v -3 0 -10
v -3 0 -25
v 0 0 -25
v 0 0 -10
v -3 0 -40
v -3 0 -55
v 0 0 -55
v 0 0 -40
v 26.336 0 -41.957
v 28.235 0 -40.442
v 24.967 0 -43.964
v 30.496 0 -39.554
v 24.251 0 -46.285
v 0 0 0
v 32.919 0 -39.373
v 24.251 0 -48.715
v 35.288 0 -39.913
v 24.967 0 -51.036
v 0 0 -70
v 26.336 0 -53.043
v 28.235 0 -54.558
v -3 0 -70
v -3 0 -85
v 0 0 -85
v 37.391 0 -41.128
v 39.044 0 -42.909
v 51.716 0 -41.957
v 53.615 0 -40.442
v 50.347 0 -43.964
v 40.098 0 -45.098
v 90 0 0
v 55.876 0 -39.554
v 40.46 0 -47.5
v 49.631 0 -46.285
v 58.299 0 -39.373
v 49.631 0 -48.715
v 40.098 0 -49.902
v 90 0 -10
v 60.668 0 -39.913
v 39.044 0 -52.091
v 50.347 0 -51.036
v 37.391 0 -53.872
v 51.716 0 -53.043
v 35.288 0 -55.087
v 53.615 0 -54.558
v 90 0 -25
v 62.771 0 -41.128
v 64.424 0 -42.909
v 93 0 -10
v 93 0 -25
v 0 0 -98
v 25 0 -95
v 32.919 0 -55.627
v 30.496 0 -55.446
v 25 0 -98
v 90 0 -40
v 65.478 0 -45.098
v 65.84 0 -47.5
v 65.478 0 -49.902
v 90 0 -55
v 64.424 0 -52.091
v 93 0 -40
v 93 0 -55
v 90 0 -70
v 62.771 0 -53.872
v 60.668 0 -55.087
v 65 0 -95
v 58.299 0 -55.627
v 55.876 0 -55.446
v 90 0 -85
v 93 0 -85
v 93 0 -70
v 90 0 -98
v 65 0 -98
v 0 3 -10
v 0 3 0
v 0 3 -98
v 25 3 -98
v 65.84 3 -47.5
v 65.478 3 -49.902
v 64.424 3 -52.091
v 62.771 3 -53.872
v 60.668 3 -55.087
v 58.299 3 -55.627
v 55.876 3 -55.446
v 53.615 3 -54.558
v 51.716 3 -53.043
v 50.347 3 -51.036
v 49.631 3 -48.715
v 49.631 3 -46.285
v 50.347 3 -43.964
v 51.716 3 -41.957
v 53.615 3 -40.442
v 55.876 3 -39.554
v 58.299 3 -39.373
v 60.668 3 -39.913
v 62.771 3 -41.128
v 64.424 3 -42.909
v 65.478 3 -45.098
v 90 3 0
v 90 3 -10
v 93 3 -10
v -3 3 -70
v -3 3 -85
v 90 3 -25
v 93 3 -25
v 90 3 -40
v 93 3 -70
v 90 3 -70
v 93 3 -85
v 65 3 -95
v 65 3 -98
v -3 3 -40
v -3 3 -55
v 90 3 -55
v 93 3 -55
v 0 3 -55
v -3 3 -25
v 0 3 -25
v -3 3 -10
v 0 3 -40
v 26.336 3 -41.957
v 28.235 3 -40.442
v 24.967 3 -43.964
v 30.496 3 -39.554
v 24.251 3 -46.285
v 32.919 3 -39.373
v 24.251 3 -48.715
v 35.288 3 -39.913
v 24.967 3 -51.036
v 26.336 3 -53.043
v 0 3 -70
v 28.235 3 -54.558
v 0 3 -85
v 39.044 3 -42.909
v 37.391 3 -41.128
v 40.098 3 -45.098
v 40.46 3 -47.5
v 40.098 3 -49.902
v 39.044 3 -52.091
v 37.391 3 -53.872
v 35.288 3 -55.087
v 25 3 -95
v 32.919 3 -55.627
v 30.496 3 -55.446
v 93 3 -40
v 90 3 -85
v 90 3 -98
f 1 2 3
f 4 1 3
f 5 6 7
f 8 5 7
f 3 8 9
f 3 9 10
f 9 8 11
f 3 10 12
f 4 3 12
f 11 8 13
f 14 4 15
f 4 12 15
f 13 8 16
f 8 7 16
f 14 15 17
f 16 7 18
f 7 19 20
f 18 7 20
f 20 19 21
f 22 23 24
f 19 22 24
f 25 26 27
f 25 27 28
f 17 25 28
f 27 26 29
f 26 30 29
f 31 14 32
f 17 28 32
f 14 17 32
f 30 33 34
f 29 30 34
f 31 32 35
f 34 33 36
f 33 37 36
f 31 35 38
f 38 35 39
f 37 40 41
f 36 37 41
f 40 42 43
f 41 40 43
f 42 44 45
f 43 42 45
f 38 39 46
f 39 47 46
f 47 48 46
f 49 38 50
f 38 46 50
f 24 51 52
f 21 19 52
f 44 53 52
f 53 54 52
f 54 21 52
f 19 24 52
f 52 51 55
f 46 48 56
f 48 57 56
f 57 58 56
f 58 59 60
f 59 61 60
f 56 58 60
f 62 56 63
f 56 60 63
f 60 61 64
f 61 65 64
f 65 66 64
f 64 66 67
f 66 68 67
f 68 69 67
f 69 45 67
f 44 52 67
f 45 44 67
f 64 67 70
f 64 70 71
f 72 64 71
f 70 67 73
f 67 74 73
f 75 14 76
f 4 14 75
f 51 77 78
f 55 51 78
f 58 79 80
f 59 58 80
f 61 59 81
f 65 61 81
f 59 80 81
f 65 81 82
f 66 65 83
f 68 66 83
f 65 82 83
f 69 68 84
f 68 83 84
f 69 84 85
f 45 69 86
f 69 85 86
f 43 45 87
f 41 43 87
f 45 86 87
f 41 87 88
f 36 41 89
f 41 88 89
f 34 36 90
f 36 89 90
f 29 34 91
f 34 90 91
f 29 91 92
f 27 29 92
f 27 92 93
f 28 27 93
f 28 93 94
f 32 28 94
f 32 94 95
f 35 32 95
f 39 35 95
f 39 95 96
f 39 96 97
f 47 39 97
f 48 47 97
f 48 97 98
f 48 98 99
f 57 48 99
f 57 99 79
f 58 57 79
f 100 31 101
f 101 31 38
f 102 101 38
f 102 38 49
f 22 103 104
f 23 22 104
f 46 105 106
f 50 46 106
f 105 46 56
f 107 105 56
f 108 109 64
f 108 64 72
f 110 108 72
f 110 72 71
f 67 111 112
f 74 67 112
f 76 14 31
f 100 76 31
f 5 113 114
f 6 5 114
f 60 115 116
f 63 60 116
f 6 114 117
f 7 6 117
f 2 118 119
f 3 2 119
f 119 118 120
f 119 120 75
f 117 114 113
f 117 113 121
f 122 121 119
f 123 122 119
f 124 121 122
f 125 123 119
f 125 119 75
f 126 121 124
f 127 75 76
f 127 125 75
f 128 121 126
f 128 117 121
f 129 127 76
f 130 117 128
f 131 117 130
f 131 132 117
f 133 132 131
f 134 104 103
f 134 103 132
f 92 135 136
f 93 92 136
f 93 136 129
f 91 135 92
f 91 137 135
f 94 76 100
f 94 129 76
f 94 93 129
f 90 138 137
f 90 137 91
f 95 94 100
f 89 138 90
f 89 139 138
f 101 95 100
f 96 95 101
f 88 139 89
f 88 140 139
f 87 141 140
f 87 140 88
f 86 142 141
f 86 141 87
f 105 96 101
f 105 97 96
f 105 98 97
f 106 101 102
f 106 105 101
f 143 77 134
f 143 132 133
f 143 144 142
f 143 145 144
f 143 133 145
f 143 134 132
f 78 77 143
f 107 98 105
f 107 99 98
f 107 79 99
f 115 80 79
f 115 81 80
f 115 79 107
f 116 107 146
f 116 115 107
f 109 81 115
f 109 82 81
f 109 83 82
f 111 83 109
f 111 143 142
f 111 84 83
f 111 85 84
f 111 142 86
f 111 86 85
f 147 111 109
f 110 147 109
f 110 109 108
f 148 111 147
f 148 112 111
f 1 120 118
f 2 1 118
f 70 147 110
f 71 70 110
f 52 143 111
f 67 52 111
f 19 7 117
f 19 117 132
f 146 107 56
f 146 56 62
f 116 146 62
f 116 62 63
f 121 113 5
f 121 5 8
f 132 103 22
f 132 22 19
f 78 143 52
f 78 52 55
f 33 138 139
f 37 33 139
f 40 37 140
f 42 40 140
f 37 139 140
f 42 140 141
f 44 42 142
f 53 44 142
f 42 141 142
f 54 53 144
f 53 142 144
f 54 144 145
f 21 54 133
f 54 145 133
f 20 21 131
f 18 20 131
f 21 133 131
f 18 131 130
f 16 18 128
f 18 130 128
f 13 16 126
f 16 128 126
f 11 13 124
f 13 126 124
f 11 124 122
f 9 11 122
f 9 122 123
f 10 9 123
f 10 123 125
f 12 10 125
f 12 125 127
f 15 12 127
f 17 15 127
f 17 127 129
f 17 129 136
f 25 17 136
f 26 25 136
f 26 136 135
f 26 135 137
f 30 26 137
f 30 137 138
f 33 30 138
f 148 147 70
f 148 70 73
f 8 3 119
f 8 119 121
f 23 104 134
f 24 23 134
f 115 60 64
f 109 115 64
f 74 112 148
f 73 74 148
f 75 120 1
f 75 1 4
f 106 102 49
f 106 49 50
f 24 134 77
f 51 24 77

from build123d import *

# Parameters (mm, degrees)
SKETCH1_W           = 90
SKETCH1_H           = 95
BOSS_EXTRUDE1_DEPTH = 3
SKETCH4_W           = 3
SKETCH4_H           = 15
BOSS_EXTRUDE4_DEPTH = 3
SKETCH5_W           = 90
SKETCH5_H           = 3
BOSS_EXTRUDE5_DEPTH = 3
SKETCH6_W           = 40
SKETCH6_H           = 3
CUT_EXTRUDE2_DEPTH  = 4
SKETCH8_R           = 8.15
CUT_EXTRUDE3_DEPTH  = 4


with BuildPart() as part:
    # Sketch1 → Boss-Extrude1 (new body)
    with BuildSketch(Plane(origin=(0, 0, 0), x_dir=(1, 0, 0), z_dir=(0, 1, 0))):
        with Locations((45, 47.5)):
            Rectangle(SKETCH1_W, SKETCH1_H)
    extrude(amount=BOSS_EXTRUDE1_DEPTH)

    # Sketch4 → Boss-Extrude4 (add)
    with BuildSketch(Plane(origin=(0, 3, 0), x_dir=(1, 0, 0), z_dir=(0, 1, 0))):
        with Locations((-1.5, 77.5)):
            Rectangle(SKETCH4_W, SKETCH4_H)
        with Locations((-1.5, 47.5)):
            Rectangle(SKETCH4_W, SKETCH4_H)
        with Locations((-1.5, 17.5)):
            Rectangle(SKETCH4_W, SKETCH4_H)
        with Locations((91.5, 77.5)):
            Rectangle(SKETCH4_W, SKETCH4_H)
        with Locations((91.5, 47.5)):
            Rectangle(SKETCH4_W, SKETCH4_H)
        with Locations((91.5, 17.5)):
            Rectangle(SKETCH4_W, SKETCH4_H)
    extrude(amount=-BOSS_EXTRUDE4_DEPTH)

    # Sketch5 → Boss-Extrude5 (add)
    with BuildSketch(Plane(origin=(0, 3, 0), x_dir=(1, 0, 0), z_dir=(0, 1, 0))):
        with Locations((45, 96.5)):
            Rectangle(SKETCH5_W, SKETCH5_H)
    extrude(amount=-BOSS_EXTRUDE5_DEPTH)

    # Sketch6 → Cut-Extrude2 (cut)
    with BuildSketch(Plane(origin=(0, 3, 0), x_dir=(1, 0, 0), z_dir=(0, 1, 0))):
        with Locations((45, 96.5)):
            Rectangle(SKETCH6_W, SKETCH6_H)
    extrude(amount=-CUT_EXTRUDE2_DEPTH, mode=Mode.SUBTRACT)

    # Sketch8 → Cut-Extrude3 (cut, through all)
    with BuildSketch(Plane(origin=(0, 3, 0), x_dir=(1, 0, 0), z_dir=(0, 1, 0))):
        with Locations((32.31, 47.5)):
            Circle(SKETCH8_R)
        with Locations((57.69, 47.5)):
            Circle(SKETCH8_R)
    extrude(amount=-CUT_EXTRUDE3_DEPTH, mode=Mode.SUBTRACT)


solid = part.part
